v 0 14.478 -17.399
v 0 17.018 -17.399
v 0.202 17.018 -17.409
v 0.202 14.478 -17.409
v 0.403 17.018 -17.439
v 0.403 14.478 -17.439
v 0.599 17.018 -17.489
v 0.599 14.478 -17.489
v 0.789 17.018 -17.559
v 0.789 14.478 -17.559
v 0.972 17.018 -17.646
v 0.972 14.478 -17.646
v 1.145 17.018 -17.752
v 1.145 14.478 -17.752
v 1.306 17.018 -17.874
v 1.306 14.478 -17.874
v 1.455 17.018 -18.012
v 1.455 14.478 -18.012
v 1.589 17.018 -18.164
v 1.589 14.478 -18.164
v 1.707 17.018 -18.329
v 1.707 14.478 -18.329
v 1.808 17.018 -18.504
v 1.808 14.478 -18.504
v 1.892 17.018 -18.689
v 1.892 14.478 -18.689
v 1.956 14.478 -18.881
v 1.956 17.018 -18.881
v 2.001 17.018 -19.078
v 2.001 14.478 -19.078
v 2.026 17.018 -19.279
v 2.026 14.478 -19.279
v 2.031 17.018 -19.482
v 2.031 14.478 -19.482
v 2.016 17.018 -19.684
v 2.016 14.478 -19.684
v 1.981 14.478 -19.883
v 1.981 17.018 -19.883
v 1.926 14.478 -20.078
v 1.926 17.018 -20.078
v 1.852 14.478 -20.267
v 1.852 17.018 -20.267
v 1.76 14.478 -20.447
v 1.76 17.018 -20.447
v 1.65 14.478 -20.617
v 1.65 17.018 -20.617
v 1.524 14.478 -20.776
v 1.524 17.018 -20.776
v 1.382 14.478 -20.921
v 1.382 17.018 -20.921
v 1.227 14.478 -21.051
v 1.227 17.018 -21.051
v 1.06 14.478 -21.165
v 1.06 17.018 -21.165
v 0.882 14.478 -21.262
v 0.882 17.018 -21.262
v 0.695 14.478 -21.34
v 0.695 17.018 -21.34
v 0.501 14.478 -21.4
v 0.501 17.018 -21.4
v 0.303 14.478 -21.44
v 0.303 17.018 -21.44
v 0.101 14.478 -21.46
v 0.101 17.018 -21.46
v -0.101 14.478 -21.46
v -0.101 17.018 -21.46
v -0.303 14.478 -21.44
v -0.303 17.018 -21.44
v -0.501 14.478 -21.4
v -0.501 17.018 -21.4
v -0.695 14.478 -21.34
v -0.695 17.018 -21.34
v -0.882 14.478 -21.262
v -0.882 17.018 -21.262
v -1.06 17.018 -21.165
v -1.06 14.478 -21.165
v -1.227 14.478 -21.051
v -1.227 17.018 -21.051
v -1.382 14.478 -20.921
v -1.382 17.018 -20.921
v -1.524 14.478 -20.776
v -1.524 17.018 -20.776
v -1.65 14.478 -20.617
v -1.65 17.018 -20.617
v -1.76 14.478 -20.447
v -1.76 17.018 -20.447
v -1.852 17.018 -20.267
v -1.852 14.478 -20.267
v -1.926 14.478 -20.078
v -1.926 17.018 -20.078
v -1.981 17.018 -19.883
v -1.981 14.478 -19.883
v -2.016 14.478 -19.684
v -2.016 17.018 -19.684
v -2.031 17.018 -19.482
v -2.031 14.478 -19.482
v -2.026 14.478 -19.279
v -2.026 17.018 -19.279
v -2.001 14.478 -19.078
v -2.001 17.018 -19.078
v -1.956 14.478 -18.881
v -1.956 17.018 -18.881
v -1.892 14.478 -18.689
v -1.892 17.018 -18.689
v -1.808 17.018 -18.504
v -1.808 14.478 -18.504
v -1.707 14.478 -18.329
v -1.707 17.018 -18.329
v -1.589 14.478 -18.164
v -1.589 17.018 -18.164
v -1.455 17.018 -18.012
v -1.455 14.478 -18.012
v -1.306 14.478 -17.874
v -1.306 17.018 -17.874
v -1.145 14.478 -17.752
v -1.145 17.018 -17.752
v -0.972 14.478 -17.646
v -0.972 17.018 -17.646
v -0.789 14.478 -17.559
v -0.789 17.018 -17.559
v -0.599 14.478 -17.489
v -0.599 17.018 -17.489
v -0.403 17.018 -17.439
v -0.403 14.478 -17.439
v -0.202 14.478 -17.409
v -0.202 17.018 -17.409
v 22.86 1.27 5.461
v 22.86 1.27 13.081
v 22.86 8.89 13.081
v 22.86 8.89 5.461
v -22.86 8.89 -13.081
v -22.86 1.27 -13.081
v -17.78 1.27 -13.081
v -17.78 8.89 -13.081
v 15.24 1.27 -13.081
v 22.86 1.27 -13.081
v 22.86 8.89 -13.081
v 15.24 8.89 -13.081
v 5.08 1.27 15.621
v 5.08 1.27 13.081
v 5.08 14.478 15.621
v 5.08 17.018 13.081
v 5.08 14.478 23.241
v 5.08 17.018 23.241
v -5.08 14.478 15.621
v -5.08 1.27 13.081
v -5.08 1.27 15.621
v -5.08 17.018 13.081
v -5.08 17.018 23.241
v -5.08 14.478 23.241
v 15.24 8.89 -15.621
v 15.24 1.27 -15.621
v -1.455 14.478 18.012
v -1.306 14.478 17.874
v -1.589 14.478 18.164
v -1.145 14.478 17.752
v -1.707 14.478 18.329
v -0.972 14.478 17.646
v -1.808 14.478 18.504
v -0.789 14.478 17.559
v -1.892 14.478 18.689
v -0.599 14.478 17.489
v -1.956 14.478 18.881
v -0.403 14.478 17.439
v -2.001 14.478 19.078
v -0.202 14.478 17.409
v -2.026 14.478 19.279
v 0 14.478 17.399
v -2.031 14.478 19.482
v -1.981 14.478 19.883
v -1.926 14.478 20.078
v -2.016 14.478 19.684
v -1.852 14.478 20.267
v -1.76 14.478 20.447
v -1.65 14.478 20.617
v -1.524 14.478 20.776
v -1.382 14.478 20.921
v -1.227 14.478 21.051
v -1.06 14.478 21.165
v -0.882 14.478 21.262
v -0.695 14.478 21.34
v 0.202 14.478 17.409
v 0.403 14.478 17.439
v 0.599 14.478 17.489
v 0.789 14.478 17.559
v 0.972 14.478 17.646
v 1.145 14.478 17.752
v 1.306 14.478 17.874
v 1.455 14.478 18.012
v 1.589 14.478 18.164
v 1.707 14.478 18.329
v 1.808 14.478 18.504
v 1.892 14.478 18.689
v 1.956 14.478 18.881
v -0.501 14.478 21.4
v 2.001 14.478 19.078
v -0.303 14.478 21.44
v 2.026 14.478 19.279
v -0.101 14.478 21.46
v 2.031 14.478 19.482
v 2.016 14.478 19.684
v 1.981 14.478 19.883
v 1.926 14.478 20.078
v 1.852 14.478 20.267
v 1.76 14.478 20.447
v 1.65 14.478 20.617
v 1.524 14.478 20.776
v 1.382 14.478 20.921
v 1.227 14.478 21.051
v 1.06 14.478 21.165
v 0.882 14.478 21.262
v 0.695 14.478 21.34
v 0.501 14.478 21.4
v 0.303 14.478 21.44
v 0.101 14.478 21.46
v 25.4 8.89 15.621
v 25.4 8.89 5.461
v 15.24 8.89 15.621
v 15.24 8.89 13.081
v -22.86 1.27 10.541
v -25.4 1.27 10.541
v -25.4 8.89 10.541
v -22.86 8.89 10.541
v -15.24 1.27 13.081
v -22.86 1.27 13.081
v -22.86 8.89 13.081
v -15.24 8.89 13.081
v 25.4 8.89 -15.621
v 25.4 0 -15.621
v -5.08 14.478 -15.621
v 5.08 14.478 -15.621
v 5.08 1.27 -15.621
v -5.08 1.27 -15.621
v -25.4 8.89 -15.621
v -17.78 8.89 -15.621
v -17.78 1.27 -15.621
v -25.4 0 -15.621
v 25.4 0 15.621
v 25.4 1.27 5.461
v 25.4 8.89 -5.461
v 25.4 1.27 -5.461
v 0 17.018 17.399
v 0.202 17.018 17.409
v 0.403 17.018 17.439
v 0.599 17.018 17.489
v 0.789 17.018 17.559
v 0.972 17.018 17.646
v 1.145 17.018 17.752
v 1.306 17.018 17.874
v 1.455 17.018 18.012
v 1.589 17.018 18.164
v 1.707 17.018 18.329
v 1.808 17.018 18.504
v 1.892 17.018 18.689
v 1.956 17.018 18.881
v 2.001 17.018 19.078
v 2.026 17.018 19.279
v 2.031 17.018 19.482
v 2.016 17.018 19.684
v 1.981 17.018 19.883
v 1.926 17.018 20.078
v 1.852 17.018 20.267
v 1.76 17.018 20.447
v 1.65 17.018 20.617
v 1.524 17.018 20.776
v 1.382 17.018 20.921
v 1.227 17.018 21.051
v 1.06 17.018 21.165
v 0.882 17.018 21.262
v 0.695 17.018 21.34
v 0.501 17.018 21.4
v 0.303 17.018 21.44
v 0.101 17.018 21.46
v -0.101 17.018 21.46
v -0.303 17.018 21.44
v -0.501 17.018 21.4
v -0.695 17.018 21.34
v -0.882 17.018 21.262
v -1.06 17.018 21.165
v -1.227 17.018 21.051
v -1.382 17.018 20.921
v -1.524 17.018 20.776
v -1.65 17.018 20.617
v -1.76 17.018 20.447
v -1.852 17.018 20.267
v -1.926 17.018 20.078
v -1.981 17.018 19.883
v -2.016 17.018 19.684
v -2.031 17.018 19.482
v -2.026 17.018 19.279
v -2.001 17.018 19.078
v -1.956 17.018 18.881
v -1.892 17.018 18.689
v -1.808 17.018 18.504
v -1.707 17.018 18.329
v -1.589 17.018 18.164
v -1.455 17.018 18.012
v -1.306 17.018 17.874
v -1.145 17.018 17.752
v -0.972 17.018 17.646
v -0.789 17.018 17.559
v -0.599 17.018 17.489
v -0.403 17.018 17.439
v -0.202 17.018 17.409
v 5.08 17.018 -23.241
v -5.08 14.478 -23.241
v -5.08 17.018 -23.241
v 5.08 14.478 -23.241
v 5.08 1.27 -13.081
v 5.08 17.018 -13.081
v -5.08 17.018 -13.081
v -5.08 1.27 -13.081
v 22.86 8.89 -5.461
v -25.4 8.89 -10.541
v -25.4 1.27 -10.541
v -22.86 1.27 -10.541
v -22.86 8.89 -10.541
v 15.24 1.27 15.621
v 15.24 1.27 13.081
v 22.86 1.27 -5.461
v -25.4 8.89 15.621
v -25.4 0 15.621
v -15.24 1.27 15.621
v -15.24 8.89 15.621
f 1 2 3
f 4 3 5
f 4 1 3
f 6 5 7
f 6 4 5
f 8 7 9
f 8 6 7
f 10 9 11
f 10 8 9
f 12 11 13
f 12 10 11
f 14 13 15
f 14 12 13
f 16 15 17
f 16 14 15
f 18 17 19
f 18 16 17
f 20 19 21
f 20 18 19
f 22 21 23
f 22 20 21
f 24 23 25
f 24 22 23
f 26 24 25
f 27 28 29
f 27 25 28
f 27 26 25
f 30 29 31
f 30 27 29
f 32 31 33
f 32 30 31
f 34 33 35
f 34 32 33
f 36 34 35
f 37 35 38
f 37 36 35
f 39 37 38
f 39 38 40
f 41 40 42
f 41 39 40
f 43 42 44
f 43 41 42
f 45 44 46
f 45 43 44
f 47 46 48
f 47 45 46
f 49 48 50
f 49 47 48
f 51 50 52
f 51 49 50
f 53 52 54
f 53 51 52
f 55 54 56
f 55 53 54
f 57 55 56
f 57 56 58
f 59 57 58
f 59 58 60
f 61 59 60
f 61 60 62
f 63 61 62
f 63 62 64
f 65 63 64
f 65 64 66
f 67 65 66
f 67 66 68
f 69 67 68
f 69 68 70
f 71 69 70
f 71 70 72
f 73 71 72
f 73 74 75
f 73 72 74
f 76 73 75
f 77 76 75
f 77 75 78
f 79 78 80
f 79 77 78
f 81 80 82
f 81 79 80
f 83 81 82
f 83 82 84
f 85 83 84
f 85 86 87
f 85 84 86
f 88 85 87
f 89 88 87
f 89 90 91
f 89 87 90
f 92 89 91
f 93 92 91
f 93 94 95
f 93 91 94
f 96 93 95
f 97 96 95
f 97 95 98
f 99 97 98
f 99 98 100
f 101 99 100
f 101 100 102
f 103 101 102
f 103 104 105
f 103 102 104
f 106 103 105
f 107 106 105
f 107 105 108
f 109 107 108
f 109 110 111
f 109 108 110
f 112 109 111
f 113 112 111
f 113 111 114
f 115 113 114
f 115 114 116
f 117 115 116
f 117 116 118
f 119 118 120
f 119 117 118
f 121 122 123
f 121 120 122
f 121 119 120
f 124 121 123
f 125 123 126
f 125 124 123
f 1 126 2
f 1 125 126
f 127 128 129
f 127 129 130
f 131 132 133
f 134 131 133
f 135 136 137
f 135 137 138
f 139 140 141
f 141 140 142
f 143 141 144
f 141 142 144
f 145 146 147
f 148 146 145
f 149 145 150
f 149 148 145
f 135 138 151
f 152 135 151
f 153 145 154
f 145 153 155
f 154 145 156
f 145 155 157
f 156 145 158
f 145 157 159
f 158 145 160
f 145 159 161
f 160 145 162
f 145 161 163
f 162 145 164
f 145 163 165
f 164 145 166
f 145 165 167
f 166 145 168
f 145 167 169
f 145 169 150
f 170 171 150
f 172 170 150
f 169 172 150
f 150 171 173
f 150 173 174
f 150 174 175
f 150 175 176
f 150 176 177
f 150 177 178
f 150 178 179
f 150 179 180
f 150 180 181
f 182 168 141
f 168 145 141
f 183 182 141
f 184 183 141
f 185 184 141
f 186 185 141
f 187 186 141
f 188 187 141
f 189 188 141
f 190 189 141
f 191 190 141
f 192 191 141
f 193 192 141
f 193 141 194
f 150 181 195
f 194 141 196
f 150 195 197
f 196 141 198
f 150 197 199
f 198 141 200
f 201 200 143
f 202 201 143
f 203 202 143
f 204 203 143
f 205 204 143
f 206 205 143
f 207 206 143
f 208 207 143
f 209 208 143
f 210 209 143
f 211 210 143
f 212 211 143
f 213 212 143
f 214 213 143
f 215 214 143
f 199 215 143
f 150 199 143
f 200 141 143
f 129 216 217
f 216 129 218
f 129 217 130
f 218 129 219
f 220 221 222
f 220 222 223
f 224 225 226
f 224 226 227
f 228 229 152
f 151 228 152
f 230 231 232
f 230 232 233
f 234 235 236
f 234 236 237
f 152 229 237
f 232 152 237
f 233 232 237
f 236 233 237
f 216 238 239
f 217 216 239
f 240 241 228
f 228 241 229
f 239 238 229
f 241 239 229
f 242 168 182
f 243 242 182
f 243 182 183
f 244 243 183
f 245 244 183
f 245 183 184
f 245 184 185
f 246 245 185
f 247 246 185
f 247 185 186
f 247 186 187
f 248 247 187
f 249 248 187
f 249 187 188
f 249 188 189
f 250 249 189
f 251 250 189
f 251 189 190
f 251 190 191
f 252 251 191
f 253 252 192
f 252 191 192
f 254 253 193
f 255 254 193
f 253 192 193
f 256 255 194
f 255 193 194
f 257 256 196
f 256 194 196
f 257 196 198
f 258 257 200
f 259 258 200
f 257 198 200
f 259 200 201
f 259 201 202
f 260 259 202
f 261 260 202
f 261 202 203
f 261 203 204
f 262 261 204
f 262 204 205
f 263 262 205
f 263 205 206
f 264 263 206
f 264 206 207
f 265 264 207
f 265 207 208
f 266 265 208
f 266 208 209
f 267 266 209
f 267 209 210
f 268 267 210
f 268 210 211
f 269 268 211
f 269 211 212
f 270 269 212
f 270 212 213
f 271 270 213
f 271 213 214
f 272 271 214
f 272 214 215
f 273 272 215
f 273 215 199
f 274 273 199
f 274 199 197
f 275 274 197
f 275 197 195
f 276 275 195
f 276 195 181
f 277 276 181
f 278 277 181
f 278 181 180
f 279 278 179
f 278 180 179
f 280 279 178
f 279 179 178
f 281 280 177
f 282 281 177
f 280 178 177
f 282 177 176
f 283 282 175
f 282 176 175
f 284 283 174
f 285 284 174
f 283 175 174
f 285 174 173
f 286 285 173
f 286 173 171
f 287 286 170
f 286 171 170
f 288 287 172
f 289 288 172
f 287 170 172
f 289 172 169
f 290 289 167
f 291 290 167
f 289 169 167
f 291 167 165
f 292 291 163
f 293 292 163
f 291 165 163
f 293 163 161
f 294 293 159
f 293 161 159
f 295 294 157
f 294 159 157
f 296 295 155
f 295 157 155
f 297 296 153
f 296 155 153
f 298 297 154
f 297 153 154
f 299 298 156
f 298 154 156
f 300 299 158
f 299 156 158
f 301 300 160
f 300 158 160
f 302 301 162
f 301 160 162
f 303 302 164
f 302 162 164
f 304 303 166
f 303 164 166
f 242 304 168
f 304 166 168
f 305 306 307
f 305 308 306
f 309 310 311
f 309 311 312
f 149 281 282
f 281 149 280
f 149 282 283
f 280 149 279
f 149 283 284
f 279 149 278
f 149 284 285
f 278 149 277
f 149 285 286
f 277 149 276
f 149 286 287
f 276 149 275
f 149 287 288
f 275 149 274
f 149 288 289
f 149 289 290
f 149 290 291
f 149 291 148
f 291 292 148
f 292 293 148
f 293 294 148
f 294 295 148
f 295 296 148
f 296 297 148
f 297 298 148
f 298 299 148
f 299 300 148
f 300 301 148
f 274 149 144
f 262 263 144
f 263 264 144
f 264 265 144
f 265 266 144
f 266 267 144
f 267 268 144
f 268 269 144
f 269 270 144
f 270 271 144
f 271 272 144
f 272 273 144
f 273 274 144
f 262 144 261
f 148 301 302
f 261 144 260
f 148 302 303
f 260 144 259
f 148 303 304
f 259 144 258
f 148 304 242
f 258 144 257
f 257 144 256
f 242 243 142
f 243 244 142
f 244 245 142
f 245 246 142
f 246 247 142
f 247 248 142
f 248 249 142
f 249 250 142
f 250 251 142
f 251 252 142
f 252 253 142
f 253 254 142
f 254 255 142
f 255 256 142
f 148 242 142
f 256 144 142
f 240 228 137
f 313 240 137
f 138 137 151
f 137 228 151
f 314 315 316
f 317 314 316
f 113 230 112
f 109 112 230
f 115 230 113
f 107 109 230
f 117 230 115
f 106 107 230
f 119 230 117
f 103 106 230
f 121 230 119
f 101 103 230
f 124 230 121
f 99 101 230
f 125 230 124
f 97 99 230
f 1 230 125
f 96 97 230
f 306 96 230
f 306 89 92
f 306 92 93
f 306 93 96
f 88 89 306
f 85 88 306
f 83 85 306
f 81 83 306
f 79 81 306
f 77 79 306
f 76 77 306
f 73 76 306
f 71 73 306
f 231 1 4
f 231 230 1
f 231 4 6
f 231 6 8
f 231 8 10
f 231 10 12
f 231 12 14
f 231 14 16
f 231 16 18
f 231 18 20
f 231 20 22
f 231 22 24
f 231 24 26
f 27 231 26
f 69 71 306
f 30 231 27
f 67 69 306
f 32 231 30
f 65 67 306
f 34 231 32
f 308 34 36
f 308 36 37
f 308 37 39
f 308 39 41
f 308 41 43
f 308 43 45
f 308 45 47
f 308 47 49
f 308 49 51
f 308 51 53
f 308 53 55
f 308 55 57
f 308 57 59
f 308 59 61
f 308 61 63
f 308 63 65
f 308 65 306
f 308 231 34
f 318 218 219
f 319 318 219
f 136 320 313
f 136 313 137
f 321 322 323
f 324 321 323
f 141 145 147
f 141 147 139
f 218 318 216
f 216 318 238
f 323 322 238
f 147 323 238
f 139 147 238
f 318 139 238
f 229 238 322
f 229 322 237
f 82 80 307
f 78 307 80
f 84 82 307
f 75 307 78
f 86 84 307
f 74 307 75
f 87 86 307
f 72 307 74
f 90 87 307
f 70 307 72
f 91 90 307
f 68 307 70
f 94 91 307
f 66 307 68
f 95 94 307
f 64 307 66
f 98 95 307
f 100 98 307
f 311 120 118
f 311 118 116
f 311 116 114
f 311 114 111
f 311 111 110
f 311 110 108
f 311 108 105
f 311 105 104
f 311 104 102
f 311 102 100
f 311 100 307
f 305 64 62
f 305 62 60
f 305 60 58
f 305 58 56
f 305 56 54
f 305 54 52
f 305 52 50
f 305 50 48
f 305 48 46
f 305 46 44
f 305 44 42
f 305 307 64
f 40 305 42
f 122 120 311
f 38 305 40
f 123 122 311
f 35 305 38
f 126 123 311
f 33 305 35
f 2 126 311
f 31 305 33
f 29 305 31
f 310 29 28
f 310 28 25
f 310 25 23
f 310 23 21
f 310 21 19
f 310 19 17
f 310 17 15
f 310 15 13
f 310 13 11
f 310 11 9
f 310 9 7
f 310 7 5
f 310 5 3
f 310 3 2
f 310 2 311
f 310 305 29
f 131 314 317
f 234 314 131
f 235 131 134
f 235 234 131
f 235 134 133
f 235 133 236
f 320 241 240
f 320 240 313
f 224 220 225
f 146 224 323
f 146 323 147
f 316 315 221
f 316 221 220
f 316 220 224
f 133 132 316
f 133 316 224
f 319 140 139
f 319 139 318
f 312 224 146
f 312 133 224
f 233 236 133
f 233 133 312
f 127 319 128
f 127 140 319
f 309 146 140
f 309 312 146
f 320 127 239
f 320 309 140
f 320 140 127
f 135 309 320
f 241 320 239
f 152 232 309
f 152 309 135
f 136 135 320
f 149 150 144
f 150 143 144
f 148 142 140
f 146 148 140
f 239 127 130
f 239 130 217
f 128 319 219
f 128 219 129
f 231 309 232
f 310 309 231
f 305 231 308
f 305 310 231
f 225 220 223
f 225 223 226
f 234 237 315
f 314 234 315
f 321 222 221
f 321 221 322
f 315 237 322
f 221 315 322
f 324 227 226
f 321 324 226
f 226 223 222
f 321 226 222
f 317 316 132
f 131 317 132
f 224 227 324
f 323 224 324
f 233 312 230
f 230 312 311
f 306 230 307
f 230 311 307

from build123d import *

# Parameters (mm, degrees)
SKETCH1_W           = 50.8
SKETCH1_H           = 31.242
BOSS_EXTRUDE1_DEPTH = 1.27
BOSS_EXTRUDE2_DEPTH = 7.62
BOSS_EXTRUDE3_DEPTH = 5.08
SKETCH4_R           = 2.032
CUT_EXTRUDE1_DEPTH  = 7.62


with BuildPart() as part:
    # Sketch1 → Boss-Extrude1 (new body)
    with BuildSketch(Plane(origin=(0, 0, 0), x_dir=(1, 0, 0), z_dir=(0, 1, 0))):
        Rectangle(SKETCH1_W, SKETCH1_H)
    extrude(amount=BOSS_EXTRUDE1_DEPTH)

    # Sketch2 → Boss-Extrude2 (add)
    with BuildSketch(Plane(origin=(0, 1.27, 0), x_dir=(1, 0, 0), z_dir=(0, 1, 0))):
        Polygon((-25.4, 10.541), (-22.86, 10.541), (-22.86, 13.081), (-17.78, 13.081), (-17.78, 15.621), (-25.4, 15.621), align=None)
        Polygon((-25.4, -10.541), (-22.86, -10.541), (-22.86, -13.081), (-15.24, -13.081), (-15.24, -15.621), (-25.4, -15.621), align=None)
        Polygon((15.24, 15.621), (25.4, 15.621), (25.4, 5.461), (22.86, 5.461), (22.86, 13.081), (15.24, 13.081), align=None)
        Polygon((25.4, -5.461), (25.4, -15.621), (15.24, -15.621), (15.24, -13.081), (22.86, -13.081), (22.86, -5.461), align=None)
    extrude(amount=BOSS_EXTRUDE2_DEPTH)

    # Sketch3 → Boss-Extrude3 (add, symmetric)
    with BuildSketch(Plane(origin=(0, 0, 0), x_dir=(0, 0, -1), z_dir=(1, 0, 0))):
        Polygon((-13.081, 0), (-15.621, 0), (-15.621, 14.478), (-23.241, 14.478), (-23.241, 17.018), (-13.081, 17.018), align=None)
    boss_extrude3 = extrude(amount=BOSS_EXTRUDE3_DEPTH, both=True)

    # Sketch4 → Cut-Extrude1 (cut)
    with BuildSketch(Plane.XZ.offset(-14.478)):
        with Locations(Location((0, 19.431, 0), (0, 0, 270))):
            Circle(SKETCH4_R)
    cut_extrude1 = extrude(amount=-CUT_EXTRUDE1_DEPTH, mode=Mode.SUBTRACT)

    # Mirror2: Boss-Extrude3 across plane
    add(boss_extrude3.mirror(Plane.XY))

    # Mirror1: Cut-Extrude1 across plane
    add(cut_extrude1.mirror(Plane.XY), mode=Mode.SUBTRACT)


solid = part.part
